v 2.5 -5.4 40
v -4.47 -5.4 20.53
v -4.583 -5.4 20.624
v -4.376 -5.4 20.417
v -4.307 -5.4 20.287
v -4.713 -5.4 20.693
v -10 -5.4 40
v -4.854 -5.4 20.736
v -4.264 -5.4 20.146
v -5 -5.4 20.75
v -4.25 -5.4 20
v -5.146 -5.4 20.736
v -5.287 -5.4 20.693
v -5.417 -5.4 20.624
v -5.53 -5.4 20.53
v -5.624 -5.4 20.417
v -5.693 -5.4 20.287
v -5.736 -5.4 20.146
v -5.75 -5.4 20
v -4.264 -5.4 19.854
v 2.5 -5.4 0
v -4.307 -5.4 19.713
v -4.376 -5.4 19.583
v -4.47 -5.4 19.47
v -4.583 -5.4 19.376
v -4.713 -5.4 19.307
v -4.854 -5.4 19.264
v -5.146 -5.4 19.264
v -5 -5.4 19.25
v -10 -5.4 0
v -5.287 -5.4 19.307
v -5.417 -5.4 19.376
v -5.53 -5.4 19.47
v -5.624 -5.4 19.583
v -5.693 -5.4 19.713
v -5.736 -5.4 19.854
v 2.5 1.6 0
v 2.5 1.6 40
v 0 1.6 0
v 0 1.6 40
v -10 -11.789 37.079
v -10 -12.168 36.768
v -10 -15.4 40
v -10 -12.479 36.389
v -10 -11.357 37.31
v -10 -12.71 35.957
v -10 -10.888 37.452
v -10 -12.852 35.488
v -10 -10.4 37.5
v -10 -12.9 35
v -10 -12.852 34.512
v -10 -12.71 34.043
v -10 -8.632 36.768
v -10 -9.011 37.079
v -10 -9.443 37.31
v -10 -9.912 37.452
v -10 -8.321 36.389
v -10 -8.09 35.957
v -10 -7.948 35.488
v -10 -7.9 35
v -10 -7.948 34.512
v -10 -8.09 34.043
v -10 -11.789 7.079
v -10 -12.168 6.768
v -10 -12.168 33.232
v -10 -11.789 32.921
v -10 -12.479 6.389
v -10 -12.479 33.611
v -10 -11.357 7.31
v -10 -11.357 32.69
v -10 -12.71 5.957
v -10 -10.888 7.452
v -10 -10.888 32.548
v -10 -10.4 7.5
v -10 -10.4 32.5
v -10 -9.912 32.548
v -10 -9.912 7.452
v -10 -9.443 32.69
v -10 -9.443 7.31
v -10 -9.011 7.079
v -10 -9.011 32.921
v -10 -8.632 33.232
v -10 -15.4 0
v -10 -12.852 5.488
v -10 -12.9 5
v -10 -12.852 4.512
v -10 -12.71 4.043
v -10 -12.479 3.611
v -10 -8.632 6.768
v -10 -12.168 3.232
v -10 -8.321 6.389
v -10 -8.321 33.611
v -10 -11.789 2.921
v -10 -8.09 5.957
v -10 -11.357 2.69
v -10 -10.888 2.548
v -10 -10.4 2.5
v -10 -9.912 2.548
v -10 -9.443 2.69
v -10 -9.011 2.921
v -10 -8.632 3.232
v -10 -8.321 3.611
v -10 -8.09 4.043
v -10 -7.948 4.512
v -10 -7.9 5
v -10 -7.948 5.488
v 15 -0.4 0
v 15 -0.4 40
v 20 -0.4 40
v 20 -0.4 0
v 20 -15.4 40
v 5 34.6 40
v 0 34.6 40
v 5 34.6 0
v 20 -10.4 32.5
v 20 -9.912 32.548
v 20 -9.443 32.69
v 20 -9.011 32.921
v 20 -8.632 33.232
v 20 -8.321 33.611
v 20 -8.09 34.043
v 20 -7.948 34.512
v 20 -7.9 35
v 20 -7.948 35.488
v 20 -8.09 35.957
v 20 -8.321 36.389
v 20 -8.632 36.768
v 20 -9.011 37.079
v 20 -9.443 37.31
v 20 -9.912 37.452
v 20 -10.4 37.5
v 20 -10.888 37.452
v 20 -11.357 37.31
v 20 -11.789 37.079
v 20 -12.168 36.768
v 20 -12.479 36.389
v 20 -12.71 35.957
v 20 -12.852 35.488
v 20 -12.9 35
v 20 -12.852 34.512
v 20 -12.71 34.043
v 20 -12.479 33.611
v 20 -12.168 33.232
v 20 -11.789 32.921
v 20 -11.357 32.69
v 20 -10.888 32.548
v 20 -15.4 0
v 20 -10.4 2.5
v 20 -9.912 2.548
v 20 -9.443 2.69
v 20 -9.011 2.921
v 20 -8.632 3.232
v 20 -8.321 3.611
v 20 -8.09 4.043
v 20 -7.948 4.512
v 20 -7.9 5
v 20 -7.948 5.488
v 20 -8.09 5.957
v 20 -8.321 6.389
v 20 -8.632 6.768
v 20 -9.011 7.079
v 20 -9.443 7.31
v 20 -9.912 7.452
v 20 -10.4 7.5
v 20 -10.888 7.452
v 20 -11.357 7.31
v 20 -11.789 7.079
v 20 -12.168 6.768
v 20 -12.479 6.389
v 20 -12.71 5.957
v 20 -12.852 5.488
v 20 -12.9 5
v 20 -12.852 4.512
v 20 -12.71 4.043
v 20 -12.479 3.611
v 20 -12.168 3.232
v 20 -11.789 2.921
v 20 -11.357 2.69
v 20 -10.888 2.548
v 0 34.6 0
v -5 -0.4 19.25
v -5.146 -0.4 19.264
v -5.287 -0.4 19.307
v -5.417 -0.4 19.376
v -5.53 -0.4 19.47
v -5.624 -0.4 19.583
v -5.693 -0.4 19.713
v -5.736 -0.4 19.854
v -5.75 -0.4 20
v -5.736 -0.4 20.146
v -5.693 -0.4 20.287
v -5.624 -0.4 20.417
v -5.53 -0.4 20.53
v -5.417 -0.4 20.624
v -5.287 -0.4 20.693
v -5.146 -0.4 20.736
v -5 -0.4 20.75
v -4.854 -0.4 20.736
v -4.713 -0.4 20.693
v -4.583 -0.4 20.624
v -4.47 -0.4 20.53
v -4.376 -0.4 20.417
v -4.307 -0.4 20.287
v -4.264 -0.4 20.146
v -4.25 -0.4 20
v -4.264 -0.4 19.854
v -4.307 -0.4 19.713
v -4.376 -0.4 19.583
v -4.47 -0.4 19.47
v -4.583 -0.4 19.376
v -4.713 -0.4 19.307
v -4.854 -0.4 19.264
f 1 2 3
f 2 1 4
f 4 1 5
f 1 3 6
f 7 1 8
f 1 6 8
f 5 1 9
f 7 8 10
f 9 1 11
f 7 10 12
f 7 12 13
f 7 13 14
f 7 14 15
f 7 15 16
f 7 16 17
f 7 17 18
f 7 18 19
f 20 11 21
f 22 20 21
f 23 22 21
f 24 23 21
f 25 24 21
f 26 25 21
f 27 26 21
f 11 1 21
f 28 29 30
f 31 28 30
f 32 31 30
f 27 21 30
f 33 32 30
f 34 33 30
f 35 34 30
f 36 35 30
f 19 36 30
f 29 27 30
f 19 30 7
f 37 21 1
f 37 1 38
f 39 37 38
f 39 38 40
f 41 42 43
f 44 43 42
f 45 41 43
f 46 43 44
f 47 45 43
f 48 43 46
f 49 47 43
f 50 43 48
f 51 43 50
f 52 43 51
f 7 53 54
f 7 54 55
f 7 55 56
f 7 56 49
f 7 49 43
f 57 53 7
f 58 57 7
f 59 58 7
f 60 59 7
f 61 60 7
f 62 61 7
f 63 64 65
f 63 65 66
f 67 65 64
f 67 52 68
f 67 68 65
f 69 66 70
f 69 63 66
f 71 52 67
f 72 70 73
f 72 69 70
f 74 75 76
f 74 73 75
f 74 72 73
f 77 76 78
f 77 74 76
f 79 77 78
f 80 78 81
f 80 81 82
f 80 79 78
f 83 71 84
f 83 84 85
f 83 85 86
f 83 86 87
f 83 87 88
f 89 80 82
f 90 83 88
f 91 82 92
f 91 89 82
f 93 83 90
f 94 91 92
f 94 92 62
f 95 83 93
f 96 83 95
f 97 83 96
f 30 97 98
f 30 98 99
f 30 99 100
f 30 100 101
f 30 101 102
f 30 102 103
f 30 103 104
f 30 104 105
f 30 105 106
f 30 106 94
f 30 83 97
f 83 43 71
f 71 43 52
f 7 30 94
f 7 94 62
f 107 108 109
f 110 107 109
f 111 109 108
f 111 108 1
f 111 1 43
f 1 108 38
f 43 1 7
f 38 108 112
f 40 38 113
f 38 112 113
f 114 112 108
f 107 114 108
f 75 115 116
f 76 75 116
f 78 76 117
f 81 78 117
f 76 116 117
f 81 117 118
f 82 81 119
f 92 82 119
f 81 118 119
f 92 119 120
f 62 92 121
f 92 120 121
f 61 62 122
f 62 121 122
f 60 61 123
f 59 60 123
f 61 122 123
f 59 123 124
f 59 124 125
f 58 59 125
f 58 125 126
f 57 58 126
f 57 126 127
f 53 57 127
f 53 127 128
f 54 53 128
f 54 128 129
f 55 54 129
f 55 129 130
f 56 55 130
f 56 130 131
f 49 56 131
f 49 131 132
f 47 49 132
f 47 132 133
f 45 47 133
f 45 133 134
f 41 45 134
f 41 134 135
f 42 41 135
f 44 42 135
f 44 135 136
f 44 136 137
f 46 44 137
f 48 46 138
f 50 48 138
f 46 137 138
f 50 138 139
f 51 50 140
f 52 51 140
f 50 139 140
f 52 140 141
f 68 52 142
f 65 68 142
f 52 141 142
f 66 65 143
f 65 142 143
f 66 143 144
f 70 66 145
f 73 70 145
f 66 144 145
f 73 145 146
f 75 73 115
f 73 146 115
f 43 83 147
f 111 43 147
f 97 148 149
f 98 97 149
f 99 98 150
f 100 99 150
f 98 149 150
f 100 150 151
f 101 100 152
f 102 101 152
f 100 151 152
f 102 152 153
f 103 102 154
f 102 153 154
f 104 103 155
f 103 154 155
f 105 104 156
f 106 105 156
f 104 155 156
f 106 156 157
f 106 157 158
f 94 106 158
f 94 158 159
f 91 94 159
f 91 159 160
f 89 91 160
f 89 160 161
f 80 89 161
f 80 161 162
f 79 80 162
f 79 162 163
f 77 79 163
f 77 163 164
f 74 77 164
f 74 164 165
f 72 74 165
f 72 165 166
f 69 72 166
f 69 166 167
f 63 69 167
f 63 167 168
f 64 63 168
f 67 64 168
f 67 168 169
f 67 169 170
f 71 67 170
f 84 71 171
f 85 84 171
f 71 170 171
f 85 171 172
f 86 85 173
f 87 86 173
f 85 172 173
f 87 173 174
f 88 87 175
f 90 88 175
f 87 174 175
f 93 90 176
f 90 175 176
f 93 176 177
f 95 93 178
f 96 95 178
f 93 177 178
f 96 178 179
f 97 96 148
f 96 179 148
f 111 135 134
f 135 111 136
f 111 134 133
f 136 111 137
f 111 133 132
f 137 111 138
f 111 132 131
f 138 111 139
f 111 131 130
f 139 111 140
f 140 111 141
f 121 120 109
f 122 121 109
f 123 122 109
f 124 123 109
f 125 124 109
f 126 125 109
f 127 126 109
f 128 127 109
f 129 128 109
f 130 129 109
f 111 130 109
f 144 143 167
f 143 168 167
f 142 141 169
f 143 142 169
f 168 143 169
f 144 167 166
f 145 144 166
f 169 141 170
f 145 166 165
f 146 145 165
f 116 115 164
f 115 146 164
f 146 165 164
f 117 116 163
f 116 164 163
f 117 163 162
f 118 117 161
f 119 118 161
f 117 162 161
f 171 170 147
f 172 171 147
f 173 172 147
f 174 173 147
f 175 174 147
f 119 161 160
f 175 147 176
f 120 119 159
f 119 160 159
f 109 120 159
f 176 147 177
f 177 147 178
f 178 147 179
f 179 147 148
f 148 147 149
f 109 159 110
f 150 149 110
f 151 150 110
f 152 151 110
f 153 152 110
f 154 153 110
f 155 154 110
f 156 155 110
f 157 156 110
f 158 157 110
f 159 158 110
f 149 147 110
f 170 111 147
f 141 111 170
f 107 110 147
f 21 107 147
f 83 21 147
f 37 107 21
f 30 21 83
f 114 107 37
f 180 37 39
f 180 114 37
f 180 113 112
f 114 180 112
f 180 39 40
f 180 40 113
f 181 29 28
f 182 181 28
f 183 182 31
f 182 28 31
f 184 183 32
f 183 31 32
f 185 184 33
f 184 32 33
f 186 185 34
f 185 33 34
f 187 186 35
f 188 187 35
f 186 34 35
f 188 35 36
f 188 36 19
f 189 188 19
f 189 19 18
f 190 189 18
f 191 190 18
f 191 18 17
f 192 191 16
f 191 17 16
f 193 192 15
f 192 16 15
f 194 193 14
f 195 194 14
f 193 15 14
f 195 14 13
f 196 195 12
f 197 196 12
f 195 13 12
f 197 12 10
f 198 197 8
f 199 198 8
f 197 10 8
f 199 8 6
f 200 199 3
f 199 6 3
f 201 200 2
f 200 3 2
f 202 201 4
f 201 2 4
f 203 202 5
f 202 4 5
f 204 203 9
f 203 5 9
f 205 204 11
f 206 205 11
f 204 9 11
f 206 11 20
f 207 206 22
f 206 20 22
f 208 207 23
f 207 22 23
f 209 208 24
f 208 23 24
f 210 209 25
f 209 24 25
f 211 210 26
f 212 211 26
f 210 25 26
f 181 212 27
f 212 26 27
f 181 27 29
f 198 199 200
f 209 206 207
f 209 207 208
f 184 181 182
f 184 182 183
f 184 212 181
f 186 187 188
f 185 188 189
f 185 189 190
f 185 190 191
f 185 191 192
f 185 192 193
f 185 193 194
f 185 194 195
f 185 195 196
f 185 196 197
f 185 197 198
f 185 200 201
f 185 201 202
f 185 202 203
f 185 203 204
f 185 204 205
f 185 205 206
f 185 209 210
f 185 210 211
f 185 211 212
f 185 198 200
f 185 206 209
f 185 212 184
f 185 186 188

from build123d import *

# Parameters (mm, degrees)
BOSS_EXTRUDE2_DEPTH = 40
SKETCH7_R           = 2.5
CUT_EXTRUDE1_DEPTH  = 61.804276165
SKETCH8_R           = 0.75
BOSS_EXTRUDE3_DEPTH = 5


with BuildPart() as part:
    # Sketch1 → Boss-Extrude2 (new body)
    with BuildSketch(Plane.XY):
        Polygon((-4.44e-06, 34.6), (4.99999556, 34.6), (14.99999556, -0.4), (19.99999556, -0.4), (19.99999556, -5.4), (19.99999556, -15.4), (-1.2662e-05, -15.4), (-10.00000444, -15.4), (-10.00000444, -5.4), (-4.44e-06, -5.4), (2.49999556, -5.4), (2.49999556, 1.6), (-4.44e-06, 1.6), align=None)
    extrude(amount=BOSS_EXTRUDE2_DEPTH)

    # Sketch7 → Cut-Extrude1 (cut, through all)
    with BuildSketch(Plane(origin=(19.99999556, 0, 0), x_dir=(0, 0, -1), z_dir=(1, 0, 0))):
        with Locations((-35, -10.4)):
            Circle(SKETCH7_R)
        with Locations((-5, -10.4)):
            Circle(SKETCH7_R)
    extrude(amount=-CUT_EXTRUDE1_DEPTH, mode=Mode.SUBTRACT)

    # Sketch8 → Boss-Extrude3 (add)
    with BuildSketch(Plane(origin=(0, -5.4, 0), x_dir=(1, 0, 0), z_dir=(0, 1, 0))):
        with Locations(Location((-5.00000444, -20, 0), (0, 0, 90))):
            Circle(SKETCH8_R)
    extrude(amount=BOSS_EXTRUDE3_DEPTH)


solid = part.part
